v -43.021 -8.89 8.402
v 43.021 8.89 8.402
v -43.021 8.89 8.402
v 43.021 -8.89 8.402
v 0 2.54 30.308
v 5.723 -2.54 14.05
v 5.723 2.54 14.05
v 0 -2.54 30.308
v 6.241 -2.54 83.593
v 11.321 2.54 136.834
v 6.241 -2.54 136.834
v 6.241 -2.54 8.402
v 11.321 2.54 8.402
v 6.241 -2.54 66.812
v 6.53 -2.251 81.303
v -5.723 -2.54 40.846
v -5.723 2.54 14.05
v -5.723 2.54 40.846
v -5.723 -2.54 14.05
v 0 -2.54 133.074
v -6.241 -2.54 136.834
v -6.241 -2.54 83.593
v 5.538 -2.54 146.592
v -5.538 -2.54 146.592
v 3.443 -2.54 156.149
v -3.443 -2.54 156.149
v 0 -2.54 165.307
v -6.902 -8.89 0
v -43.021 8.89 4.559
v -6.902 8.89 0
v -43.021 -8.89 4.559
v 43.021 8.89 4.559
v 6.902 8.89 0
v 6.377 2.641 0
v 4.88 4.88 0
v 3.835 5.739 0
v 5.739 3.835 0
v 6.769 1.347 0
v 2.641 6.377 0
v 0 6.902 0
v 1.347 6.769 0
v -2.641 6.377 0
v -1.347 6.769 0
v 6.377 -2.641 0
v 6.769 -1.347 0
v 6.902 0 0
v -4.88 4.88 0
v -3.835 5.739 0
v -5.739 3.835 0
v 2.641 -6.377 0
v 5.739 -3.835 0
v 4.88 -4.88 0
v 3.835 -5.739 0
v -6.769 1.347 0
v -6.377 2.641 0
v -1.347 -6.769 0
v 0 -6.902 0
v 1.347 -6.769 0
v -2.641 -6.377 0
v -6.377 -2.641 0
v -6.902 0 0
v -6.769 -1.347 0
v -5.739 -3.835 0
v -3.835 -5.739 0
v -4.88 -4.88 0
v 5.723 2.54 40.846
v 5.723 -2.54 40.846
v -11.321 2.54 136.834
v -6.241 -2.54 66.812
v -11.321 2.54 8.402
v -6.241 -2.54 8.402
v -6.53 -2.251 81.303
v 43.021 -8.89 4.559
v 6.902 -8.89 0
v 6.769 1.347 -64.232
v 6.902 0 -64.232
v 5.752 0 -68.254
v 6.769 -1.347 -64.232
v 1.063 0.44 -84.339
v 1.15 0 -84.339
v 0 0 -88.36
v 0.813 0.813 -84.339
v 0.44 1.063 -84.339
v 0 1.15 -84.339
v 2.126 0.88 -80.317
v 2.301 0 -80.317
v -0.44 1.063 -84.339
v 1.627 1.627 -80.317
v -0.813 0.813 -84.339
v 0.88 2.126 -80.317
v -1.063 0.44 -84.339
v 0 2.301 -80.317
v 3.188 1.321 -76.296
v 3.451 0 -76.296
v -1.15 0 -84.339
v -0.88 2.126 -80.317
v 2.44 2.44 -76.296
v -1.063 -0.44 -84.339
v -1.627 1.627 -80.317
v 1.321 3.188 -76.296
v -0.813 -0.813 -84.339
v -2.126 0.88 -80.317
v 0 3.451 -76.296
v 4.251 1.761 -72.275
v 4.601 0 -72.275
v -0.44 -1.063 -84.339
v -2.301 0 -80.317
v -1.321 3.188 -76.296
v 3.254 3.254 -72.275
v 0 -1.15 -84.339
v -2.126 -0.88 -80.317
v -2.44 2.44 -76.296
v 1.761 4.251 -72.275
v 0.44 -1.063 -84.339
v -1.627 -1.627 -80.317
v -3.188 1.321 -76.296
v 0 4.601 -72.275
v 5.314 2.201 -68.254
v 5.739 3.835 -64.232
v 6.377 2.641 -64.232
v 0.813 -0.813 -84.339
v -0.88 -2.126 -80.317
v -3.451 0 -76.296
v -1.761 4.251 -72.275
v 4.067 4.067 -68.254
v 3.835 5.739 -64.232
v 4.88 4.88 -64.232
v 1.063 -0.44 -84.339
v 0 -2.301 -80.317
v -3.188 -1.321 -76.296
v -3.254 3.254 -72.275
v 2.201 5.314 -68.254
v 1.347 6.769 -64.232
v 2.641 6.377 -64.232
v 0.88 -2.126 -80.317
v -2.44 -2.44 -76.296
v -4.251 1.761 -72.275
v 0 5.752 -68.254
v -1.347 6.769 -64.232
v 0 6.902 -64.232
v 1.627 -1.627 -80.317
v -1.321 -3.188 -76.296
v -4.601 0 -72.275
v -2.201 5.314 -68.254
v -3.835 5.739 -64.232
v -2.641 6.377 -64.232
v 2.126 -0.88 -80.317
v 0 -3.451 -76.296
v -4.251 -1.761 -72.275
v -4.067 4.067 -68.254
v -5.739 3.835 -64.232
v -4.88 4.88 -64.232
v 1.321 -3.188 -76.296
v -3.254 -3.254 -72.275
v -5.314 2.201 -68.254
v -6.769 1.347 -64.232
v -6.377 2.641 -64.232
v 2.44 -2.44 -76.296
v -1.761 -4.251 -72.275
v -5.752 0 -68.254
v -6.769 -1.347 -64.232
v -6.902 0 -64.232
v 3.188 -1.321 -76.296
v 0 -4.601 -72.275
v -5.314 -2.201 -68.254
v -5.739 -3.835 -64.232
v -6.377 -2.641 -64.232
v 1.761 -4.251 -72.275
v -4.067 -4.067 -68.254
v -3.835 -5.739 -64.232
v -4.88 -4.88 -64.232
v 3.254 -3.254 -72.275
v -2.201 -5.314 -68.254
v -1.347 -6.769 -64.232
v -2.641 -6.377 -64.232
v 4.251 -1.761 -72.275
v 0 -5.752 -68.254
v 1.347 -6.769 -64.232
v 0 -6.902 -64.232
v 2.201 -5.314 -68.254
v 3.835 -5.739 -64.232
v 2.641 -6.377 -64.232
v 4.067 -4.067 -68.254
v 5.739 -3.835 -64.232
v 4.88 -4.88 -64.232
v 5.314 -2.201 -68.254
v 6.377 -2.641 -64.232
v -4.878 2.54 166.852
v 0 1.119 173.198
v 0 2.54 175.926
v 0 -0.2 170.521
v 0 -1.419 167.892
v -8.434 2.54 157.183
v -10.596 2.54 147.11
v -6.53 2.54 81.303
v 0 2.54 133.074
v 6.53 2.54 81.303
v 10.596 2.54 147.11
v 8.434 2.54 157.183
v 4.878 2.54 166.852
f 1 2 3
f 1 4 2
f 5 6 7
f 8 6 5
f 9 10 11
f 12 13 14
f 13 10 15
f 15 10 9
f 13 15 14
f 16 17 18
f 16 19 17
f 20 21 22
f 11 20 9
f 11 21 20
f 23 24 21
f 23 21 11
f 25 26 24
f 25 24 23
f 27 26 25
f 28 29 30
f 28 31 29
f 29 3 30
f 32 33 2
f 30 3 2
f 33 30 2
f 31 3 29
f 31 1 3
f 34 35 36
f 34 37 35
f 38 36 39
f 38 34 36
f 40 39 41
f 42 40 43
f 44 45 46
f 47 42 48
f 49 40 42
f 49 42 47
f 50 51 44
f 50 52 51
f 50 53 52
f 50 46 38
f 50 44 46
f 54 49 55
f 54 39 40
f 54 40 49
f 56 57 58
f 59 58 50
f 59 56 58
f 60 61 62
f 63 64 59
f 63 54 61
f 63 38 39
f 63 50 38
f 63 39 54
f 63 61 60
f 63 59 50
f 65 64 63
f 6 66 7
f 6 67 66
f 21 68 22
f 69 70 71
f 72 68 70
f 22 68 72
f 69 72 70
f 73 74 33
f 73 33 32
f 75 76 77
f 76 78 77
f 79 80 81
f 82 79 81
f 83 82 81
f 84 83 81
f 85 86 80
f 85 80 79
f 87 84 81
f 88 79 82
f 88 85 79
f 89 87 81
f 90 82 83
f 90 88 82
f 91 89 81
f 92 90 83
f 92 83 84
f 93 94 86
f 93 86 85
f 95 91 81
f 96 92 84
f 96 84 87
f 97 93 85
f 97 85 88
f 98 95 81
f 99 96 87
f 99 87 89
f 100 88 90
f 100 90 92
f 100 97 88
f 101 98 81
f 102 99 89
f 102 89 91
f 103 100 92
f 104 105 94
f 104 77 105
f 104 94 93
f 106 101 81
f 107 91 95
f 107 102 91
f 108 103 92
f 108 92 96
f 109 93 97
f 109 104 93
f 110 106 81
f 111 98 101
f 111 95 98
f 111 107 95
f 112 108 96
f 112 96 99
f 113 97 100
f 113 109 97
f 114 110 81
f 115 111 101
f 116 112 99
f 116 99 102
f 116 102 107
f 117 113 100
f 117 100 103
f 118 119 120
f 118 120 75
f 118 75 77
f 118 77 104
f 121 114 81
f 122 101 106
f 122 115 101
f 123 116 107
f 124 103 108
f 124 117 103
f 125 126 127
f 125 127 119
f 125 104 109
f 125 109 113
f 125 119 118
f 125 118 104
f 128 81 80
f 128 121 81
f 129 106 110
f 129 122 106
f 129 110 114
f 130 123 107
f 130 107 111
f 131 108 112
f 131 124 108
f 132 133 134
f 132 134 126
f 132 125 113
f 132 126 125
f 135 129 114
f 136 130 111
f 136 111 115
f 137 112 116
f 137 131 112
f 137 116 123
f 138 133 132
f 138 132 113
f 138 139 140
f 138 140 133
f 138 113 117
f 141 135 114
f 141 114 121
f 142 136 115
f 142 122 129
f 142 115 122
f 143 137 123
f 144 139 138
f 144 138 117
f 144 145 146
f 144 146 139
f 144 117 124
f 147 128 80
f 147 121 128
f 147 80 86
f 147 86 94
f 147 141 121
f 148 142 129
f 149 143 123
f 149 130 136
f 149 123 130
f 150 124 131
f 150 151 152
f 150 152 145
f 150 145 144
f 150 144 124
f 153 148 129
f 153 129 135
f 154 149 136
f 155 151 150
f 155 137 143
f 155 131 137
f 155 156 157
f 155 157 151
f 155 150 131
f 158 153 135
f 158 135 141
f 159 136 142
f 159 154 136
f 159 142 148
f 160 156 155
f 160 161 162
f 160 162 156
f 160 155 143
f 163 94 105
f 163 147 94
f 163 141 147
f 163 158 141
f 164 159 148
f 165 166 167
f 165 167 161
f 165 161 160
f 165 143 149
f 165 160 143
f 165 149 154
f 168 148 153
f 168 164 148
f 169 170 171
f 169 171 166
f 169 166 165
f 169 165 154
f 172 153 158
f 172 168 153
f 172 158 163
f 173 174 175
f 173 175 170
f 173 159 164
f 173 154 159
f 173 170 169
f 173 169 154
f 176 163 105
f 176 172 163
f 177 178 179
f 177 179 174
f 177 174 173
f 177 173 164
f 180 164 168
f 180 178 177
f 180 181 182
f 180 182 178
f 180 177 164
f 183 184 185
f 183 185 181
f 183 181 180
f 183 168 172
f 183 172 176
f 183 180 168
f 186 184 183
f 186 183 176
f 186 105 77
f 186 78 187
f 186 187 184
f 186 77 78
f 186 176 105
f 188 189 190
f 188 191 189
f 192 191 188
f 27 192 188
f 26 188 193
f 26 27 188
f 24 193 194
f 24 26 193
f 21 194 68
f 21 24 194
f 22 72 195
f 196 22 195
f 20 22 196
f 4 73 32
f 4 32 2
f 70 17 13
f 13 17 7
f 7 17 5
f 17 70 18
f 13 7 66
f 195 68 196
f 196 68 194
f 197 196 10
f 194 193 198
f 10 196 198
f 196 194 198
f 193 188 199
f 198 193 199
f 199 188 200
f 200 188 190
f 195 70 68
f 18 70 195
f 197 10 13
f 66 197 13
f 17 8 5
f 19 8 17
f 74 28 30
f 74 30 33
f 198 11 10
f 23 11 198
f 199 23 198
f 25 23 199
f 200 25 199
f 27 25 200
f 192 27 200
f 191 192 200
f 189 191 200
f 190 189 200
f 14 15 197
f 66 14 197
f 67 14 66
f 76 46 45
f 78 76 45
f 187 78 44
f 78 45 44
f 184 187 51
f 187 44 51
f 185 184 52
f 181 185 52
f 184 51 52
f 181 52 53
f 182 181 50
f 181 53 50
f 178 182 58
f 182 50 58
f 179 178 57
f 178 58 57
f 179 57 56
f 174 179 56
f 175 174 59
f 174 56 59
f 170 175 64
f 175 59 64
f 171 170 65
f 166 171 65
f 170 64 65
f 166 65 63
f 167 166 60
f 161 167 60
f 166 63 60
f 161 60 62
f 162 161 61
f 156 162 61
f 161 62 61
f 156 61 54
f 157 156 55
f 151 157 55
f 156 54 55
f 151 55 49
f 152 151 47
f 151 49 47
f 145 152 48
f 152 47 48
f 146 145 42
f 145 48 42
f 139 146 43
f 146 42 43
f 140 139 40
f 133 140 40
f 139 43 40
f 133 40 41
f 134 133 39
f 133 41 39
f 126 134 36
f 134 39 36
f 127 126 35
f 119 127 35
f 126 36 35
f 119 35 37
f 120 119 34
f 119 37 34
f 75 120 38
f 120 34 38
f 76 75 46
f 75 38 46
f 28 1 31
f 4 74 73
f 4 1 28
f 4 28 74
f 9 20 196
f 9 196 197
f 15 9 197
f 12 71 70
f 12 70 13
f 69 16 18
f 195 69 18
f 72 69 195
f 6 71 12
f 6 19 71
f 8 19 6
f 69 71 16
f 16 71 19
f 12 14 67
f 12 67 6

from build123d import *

# Parameters (mm, degrees)
F0_W        = 6.9019780494
F0_H        = 64.2322748899
F3_DEPTH    = 8.89
F4_DEPTH    = 2.54
F5_T1_DEPTH = 141.4955107475
F5_T4_ANGLE = 42.5345423557
F5_T6_ANGLE = 42.5345423557


# Not quite as in the source:
# - a fillet or chamfer that OpenCascade refuses, or shapes differently, is made with other operations: its cross-section is extruded or revolved along the edge and cut away or added


with BuildPart() as f1:
    # F0 (on Front) → F1 (revolve)
    with BuildSketch(Plane.XZ):
        with Locations((3.4509890247, -32.116137445)):
            Rectangle(F0_W, F0_H)
    revolve(axis=Axis((0, 0, -32.116137445), (0, 0, -1)))

    # F0 (on Front) → F2 (revolve)
    with BuildSketch(Plane.XZ):
        Polygon((6.9019780494, -64.2322748899), (0, -64.2322748899), (0, -88.3597657084), align=None)
    revolve(axis=Axis((0, 0, -76.2960202992), (0, 0, 1)))


with BuildPart() as f3:
    # F0 (on Front) → F3 (new body, symmetric)
    with BuildSketch(Plane.XZ):
        Polygon((-43.0214107037, 4.5587546192), (-6.9019780494, 0), (0, 0), (6.9019780494, 0), (43.0214107037, 4.5587546192), (43.0214107037, 8.4022246301), (11.3210510463, 8.4022246301), (0, 8.4022246301), (-11.3210510463, 8.4022246301), (-43.0214107037, 8.4022246301), align=None)
    extrude(amount=F3_DEPTH, both=True)


with BuildPart() as f4:
    # F0 (on Front) → F4 (new body, symmetric)
    with BuildSketch(Plane.XZ):
        with BuildLine():
            Line((-11.3210510463, 136.8335857987), (-11.3210510463, 8.4022246301))
            Line((-11.3210510463, 8.4022246301), (0, 8.4022246301))
            Line((0, 8.4022246301), (11.3210510463, 8.4022246301))
            Line((11.3210510463, 8.4022246301), (11.3210510463, 136.8335857987))
            ThreePointArc((11.3210510463, 136.8335857987), (8.4338116967, 157.1828142535), (0, 175.9257614613))
            ThreePointArc((0, 175.9257614613), (-8.4338116967, 157.1828142535), (-11.3210510463, 136.8335857987))
        make_face()
        Polygon((-5.7232712246, 40.8455764441), (-6.5300096758, 81.3025683165), (0, 133.073836565), (6.5300096758, 81.3025683165), (5.7232712246, 40.8455764441), (5.7232712246, 14.0499221161), (0, 30.3084515035), (-5.7232712246, 14.0499221161), align=None, mode=Mode.SUBTRACT)
    extrude(amount=F4_DEPTH, both=True)

    # F5: chamfer of 5.08 on 2 edges, made by hand

    # F5_s2 → F5_t1 (cut)
    with BuildSketch(Plane.XY.offset(-4.6619249487)):
        Polygon((-11.3210510463, 2.54), (-6.2410510463, -2.54), (-11.3210510463, -2.54), align=None)
        Polygon((11.3210510463, 2.54), (6.2410510463, -2.54), (11.3210510463, -2.54), align=None)
    extrude(amount=F5_T1_DEPTH, mode=Mode.SUBTRACT)

    # F5_s3 → F5_t4 (revolve, cut)
    with BuildSketch(Plane.XY.offset(136.8335857987)):
        Polygon((11.3210510463, 2.54), (6.2410510463, -2.54), (11.3210510463, -2.54), align=None)
    revolve(axis=Axis((-61.8331281927, -2.54, 136.8335857987), (0, -1, 0)), revolution_arc=F5_T4_ANGLE, mode=Mode.SUBTRACT)

    # F5_s5 → F5_t6 (revolve, cut)
    with BuildSketch(Plane(origin=(96.4227325292, 0, 105.0996687872), x_dir=(0, 1, 0), z_dir=(0.676034573, 0, 0.7368699045))):
        Polygon((2.54, 120.0954427185), (-2.54, 115.0154427185), (-2.54, 120.0954427185), align=None)
    revolve(axis=Axis((61.8331281927, -2.54, 136.8335857987), (0, -1, 0)), revolution_arc=F5_T6_ANGLE, mode=Mode.SUBTRACT)


solid = Compound([f1.part, f3.part, f4.part])
